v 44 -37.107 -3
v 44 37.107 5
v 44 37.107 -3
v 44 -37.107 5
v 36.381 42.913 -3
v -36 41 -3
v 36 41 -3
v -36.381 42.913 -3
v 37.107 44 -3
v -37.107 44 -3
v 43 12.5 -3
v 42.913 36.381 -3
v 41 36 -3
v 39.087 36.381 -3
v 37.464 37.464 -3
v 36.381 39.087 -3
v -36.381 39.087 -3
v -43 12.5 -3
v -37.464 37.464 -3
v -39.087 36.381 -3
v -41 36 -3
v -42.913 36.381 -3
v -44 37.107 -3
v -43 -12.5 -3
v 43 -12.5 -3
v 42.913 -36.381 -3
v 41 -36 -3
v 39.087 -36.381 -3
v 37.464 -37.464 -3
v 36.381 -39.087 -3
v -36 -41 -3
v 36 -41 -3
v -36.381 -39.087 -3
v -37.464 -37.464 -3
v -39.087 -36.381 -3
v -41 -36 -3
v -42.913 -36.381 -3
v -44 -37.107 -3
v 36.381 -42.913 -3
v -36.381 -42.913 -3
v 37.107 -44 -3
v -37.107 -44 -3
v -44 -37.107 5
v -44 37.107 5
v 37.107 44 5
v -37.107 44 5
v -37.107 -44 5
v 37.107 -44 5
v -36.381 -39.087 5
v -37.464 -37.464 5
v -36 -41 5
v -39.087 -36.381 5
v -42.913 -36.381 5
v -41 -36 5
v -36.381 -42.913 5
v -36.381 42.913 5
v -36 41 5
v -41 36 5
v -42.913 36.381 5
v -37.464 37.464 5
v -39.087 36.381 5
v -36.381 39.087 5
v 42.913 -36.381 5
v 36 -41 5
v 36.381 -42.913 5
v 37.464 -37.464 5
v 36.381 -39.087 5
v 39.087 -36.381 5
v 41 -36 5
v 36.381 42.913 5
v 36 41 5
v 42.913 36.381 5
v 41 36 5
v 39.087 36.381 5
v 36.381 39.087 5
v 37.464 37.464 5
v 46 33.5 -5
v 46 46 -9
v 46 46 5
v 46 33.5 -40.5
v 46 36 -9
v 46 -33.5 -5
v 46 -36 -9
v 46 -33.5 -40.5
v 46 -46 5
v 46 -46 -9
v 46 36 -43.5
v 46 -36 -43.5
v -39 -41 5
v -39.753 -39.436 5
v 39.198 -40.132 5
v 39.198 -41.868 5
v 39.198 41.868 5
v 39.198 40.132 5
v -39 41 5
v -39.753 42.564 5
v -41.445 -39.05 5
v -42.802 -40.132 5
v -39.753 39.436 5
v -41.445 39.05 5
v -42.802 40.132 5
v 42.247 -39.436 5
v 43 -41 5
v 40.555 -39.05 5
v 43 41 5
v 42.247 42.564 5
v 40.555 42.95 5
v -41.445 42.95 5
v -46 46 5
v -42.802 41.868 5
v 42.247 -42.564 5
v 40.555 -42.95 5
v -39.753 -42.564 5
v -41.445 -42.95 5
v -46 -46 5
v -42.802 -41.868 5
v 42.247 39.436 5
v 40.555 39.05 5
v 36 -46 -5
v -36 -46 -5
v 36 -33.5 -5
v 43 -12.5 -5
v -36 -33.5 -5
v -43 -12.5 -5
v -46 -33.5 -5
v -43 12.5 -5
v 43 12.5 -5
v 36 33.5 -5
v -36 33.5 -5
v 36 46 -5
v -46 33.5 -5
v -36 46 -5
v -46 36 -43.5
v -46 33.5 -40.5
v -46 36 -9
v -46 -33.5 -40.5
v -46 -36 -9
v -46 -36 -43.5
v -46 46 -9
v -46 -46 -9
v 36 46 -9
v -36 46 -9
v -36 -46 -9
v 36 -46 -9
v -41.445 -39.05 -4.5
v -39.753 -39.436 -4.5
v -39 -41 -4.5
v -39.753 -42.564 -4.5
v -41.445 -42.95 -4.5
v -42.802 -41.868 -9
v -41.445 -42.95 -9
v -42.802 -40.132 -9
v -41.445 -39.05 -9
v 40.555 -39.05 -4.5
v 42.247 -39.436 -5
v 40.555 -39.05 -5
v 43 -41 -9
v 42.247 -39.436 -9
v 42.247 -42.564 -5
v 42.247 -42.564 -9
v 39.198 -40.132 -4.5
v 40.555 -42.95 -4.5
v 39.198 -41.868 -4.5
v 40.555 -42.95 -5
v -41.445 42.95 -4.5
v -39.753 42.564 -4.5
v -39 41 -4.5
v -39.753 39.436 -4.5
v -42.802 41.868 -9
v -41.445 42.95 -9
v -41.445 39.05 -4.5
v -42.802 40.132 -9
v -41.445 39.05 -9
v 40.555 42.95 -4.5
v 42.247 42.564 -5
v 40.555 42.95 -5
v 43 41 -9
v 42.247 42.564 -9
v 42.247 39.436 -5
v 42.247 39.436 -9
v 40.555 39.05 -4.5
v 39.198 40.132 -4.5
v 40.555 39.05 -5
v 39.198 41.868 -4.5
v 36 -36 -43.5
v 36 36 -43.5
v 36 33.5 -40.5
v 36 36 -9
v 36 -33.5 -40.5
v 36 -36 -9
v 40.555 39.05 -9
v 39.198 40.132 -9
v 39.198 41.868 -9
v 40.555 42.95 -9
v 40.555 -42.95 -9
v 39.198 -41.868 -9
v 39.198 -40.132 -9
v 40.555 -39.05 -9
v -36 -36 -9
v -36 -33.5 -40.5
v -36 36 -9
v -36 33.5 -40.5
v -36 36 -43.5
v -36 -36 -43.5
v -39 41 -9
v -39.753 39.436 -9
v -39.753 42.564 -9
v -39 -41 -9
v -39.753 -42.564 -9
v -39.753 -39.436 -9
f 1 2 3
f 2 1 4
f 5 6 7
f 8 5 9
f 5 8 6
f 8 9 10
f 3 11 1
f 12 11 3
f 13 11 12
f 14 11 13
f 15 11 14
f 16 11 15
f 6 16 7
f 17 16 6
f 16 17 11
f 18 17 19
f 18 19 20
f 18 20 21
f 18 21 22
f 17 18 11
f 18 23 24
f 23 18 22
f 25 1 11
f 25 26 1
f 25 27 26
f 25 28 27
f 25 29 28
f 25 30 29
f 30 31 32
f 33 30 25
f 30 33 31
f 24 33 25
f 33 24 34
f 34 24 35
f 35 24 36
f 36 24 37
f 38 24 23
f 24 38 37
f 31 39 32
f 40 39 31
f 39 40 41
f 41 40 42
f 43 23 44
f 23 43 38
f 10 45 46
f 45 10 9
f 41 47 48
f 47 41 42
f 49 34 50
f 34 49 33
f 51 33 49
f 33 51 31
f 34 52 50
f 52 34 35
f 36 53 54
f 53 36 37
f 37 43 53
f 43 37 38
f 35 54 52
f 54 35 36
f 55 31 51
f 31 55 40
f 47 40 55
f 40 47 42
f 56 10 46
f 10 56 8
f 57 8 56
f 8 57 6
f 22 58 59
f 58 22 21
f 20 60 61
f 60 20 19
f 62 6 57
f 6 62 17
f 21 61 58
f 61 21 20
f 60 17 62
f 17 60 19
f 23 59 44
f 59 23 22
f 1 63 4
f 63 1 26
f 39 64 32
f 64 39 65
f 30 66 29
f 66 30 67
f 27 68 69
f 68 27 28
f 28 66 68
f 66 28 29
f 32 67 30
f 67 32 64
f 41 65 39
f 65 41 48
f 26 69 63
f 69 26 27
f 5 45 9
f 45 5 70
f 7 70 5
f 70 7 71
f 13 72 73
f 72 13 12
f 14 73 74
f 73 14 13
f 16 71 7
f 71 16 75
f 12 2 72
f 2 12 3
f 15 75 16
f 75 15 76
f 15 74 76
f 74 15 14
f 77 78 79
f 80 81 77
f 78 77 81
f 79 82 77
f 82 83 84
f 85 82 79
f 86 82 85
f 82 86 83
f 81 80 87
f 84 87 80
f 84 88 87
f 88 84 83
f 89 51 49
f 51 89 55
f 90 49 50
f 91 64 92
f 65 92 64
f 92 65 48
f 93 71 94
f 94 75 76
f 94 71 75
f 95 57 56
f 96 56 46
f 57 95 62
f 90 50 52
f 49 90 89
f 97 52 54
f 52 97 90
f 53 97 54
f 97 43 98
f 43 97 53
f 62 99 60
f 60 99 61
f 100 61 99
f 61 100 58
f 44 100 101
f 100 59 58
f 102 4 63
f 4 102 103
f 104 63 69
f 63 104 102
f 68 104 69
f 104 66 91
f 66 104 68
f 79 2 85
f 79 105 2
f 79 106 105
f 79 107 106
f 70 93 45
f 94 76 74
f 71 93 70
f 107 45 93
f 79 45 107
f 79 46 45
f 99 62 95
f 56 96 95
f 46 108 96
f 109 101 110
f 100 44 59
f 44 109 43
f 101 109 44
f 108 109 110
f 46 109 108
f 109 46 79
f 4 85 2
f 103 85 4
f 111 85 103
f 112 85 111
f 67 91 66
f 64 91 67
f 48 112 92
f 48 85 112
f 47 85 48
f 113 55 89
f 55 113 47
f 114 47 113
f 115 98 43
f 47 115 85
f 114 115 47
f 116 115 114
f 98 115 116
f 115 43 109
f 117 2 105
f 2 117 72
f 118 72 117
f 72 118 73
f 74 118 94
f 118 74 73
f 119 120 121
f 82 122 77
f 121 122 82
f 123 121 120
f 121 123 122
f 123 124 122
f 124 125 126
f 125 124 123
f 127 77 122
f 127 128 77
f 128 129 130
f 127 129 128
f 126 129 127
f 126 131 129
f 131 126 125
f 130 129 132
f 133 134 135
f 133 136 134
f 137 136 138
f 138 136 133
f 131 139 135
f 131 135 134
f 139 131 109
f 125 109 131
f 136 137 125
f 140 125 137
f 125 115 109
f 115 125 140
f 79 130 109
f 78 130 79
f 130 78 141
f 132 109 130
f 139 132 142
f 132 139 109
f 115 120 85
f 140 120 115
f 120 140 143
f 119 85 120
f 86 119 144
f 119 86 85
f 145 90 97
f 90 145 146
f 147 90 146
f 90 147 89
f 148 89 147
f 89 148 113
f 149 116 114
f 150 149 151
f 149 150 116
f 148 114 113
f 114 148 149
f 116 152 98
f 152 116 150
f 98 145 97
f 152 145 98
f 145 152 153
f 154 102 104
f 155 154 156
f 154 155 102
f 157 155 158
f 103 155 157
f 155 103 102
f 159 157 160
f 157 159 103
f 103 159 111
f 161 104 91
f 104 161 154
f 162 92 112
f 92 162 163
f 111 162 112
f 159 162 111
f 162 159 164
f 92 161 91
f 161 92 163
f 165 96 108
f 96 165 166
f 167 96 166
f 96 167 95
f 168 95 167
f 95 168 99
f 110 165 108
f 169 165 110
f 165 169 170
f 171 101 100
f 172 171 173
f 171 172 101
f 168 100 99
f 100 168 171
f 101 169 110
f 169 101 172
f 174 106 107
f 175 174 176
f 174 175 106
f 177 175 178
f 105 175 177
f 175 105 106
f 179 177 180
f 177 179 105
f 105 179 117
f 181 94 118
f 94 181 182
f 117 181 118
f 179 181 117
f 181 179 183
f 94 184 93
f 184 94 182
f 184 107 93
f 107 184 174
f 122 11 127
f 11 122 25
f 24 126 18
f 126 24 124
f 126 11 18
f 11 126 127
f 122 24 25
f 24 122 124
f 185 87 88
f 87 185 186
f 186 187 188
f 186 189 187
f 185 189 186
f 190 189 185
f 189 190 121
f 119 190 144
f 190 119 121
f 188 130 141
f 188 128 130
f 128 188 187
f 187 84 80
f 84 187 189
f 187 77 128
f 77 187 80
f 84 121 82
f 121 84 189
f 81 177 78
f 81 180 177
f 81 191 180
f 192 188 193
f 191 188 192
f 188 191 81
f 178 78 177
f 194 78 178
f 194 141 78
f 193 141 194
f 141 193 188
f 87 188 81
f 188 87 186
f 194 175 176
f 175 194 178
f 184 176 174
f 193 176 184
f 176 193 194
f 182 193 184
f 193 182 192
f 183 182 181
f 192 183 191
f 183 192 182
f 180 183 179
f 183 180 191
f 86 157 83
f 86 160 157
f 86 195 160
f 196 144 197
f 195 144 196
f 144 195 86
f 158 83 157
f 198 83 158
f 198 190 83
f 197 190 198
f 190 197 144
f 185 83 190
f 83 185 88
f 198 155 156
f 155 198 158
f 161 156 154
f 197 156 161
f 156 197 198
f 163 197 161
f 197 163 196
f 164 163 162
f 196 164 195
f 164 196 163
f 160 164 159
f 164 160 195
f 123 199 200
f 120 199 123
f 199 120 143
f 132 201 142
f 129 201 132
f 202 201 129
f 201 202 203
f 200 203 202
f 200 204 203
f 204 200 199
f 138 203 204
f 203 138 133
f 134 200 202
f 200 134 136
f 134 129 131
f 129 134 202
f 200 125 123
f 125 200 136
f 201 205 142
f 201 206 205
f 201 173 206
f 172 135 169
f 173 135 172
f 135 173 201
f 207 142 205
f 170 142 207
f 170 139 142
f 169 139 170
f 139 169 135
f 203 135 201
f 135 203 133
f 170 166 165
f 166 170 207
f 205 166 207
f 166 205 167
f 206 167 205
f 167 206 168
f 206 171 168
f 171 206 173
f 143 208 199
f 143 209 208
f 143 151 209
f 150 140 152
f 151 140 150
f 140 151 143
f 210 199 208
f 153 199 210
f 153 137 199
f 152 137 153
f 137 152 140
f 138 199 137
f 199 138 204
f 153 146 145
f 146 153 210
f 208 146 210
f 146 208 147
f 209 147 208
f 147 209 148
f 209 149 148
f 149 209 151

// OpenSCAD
module bracket(centres, height)
{
c = centres/2;

	difference()
	{
		cube([10, centres+10, height+3], center = true);
		translate([0,0, 3])
			cube([20, centres-15, height+3], center = true);
		translate([0,c, -8])
			cube([10, 10, height+10], center = true);
		translate([0, c, 0])
					cylinder(h = 60, r1 = 2, r2 = 2, center = true);
		translate([0,-c, -8])
			cube([10, 10, height+10], center = true);
		translate([0, -c, 0])
					cylinder(h = 60, r1 = 2, r2 = 2, center = true);
	}
}
module duct(centres, width)
{
	c = centres/2;

	difference()
	{
		cube([centres+10, centres+10, 10], center = true);
		translate([0, 0, 7])
			difference()
			{	
		     	cube([centres+6, centres+6, 20], center = true);
				translate([-c, -c, 0])
					cylinder(h = 30, r1 = 5, r2 = 5, center = true);
				translate([-c, c, 0])
					cylinder(h = 30, r1 = 5, r2 = 5, center = true);
				translate([c, -c, 0])
					cylinder(h = 30, r1 = 5, r2 = 5, center = true);
				translate([c, c, 0])
					cylinder(h = 30, r1 = 5, r2 = 5, center = true);
			}
		translate([-c, -c, 0])
					cylinder(h = 30, r1 = 2, r2 = 2, center = true);
		translate([c, -c, 0])
					cylinder(h = 30, r1 = 2, r2 = 2, center = true);
		translate([-c, c, 0])
					cylinder(h = 30, r1 = 2, r2 = 2, center = true);
		translate([c, c, 0])
					cylinder(h = 30, r1 = 2, r2 = 2, center = true);
          //translate([0, c/2, 0])
					cube([centres+4, width, 30], center = true);
	}
}

module cooler(centres, width, height)
{
	duct(centres, width);
	translate([centres/2, 0,  -(7+height+5)/2])
		bracket(centres, height);
	translate([-centres/2, 0,  -(7+height+5)/2])
		bracket(centres, height);
}

cooler(82, 25, 36);
